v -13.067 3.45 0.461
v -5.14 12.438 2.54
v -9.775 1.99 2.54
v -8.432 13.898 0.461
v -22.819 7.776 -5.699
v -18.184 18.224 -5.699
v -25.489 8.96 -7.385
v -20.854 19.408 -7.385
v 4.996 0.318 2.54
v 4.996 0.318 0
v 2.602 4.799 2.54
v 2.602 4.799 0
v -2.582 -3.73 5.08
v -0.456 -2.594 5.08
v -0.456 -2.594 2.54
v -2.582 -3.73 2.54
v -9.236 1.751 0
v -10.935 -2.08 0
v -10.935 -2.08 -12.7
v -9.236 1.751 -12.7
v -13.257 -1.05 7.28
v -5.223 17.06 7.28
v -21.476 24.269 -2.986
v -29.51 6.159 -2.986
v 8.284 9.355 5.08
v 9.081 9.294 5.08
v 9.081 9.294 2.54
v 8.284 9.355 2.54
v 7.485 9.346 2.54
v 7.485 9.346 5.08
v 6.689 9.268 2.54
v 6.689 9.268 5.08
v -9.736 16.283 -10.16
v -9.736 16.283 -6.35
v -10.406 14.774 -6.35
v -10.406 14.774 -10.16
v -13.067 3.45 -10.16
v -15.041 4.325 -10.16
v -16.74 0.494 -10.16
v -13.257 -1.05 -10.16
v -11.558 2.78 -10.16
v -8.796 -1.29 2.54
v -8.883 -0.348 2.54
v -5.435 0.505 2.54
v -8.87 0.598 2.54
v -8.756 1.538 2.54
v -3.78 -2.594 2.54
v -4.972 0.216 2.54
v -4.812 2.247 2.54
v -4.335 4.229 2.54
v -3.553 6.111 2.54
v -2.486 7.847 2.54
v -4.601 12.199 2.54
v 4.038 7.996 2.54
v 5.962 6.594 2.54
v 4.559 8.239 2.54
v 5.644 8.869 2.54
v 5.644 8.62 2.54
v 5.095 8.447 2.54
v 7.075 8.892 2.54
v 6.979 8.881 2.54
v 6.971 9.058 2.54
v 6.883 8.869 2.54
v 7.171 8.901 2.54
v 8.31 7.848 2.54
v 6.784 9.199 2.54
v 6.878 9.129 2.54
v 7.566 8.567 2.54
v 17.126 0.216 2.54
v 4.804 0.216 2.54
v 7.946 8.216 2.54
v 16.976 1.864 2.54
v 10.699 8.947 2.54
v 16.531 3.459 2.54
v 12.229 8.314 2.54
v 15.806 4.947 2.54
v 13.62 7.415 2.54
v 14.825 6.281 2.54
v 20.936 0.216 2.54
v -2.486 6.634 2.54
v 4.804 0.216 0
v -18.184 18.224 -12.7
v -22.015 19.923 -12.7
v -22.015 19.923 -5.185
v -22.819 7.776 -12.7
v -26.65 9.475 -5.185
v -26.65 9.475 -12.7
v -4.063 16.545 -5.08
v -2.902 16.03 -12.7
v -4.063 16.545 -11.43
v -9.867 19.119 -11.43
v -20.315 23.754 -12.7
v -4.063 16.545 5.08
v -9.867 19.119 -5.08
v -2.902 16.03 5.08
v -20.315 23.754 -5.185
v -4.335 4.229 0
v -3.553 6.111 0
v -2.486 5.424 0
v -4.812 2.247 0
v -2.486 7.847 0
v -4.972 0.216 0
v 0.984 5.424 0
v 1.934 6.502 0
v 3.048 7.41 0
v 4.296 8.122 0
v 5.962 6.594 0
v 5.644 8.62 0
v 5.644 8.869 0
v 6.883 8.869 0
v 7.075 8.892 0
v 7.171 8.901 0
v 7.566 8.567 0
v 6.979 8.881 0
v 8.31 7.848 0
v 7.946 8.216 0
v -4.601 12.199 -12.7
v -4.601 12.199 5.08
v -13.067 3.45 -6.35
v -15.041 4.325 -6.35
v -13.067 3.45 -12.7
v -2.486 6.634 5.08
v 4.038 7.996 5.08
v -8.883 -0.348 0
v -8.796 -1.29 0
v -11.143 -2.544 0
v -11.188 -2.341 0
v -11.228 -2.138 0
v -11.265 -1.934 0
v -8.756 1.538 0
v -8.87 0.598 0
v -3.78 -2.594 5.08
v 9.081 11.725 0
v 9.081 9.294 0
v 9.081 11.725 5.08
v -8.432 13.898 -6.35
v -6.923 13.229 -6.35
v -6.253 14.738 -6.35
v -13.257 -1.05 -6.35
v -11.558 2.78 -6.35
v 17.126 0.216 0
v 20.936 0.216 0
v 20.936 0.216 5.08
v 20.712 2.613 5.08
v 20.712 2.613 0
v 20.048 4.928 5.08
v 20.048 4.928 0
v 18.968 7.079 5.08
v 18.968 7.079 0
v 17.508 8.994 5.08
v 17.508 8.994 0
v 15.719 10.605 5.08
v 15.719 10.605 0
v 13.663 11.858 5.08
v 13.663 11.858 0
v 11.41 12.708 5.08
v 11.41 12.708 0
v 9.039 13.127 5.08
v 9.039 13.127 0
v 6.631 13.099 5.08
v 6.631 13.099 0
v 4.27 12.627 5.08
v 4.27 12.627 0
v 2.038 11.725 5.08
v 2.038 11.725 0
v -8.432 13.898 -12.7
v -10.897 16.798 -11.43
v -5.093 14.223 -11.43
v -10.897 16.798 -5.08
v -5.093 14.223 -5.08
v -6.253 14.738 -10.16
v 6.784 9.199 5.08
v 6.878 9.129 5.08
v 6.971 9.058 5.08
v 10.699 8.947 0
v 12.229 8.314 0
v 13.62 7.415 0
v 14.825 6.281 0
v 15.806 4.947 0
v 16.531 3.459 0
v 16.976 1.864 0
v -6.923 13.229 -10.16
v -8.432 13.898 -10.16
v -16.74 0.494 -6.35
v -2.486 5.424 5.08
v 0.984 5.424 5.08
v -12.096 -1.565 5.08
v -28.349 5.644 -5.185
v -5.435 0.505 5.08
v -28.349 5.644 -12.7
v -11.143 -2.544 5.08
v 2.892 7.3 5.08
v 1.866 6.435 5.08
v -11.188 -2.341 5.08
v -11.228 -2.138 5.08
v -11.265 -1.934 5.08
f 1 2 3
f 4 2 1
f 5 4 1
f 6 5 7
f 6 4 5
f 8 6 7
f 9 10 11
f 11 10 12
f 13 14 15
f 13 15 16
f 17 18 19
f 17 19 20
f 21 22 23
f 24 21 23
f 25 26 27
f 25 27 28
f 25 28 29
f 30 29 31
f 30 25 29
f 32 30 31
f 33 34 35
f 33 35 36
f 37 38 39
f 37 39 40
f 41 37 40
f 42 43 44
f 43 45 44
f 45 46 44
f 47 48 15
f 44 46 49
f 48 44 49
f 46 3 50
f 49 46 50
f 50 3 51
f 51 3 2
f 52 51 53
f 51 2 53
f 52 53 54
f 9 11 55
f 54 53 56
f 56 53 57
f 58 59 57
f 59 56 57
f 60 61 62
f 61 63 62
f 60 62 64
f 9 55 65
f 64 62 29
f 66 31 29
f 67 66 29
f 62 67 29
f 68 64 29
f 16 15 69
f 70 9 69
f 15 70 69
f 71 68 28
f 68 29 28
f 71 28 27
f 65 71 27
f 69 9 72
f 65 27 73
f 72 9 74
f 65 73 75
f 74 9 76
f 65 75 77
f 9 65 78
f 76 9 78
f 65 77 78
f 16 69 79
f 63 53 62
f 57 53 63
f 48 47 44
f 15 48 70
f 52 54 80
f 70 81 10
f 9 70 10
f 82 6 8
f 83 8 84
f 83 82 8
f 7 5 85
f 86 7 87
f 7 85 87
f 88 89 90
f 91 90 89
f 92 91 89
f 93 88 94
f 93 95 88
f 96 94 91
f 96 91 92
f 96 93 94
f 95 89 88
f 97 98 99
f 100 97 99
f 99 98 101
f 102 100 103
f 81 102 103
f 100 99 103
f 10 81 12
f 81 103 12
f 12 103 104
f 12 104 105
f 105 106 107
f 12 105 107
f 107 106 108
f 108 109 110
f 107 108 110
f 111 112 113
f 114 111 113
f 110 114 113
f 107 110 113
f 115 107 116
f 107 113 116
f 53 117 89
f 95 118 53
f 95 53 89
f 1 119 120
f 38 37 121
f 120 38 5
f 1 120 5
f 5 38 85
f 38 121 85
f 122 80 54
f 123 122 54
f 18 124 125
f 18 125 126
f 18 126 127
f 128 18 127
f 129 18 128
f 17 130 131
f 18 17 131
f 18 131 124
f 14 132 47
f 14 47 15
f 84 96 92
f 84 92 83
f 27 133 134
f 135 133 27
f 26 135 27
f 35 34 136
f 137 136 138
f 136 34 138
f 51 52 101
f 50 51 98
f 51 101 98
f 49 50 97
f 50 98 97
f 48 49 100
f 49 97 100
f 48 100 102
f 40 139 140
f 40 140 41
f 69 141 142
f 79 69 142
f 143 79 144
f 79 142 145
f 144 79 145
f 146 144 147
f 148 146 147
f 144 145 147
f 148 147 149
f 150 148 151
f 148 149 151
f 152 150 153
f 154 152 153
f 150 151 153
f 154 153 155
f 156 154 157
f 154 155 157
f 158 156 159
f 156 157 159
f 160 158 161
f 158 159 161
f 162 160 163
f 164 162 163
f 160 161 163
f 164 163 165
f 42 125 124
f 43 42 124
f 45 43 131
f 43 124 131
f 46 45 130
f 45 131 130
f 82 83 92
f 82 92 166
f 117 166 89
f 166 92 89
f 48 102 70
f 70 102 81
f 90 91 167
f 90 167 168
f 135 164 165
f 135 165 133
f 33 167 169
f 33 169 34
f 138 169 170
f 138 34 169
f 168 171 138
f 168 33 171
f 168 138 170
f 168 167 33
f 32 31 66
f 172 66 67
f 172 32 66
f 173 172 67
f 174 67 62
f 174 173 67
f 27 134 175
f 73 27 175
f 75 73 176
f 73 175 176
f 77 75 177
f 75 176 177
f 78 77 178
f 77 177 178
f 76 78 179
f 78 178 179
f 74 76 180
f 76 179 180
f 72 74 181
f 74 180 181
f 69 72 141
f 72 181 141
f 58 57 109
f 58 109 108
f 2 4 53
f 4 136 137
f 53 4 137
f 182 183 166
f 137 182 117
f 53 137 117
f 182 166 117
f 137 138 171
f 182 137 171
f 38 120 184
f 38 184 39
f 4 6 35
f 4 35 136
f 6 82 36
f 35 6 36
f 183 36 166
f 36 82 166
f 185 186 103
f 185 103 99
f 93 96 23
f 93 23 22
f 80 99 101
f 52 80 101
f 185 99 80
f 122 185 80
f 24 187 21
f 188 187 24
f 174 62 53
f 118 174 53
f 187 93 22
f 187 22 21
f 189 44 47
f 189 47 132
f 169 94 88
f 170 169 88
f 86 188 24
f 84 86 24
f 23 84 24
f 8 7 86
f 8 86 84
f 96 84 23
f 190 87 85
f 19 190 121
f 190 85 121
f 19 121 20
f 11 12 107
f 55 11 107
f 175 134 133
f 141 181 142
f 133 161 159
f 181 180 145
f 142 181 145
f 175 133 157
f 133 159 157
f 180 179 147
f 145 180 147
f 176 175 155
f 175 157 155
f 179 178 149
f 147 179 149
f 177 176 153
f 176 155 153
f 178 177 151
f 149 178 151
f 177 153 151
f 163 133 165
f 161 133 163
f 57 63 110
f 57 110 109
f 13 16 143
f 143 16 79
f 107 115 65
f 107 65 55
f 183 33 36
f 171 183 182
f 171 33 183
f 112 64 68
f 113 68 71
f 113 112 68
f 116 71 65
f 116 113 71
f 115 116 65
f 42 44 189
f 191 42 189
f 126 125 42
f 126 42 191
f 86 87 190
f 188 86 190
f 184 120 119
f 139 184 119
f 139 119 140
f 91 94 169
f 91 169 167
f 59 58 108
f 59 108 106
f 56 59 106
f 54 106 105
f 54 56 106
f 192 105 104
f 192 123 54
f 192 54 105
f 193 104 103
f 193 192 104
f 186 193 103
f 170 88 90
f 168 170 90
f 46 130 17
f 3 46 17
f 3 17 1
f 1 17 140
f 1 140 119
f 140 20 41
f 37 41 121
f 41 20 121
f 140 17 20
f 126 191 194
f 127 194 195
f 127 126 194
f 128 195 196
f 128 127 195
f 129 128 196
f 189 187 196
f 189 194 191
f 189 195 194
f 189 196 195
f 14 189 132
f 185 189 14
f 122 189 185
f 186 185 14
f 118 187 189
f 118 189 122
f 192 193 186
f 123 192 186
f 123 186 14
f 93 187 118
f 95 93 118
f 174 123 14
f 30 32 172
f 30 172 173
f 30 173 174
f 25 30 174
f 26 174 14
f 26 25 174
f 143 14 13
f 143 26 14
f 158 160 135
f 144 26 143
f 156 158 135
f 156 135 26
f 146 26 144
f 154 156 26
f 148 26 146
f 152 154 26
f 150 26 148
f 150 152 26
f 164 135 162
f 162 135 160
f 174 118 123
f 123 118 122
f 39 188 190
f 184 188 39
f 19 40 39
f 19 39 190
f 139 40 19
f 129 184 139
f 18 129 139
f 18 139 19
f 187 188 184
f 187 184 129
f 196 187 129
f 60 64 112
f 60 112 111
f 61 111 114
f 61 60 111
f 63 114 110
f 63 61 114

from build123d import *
from build123d.topology import SkipClean

# Parameters (mm, degrees)
BOSS_EXTRUDE1_DEPTH      = 5.08
CUT_EXTRUDE1_DEPTH       = 2.54
SKETCH3_W                = 9.11222741
SKETCH3_H                = 2.54
BOSS_EXTRUDE2_DEPTH      = 5.08
BOSS_EXTRUDE3_DEPTH      = 17.78
CUT_EXTRUDE2_DEPTH       = 15.24
CUT_EXTRUDE3_DEPTH       = 11.43
CHAMFER1_SIZE            = 10.265287786
CHAMFER1_SIZE_2          = 17.78
SKETCH7_W                = 3.81
SKETCH7_H                = 3.81
CUT_EXTRUDE4_DEPTH       = 25.4
SKETCH8_W                = 6.35
SKETCH8_H                = 6.35
CUT_EXTRUDE5_DEPTH       = 2.54
BOSS_EXTRUDE4_DEPTH      = 2.54
BOSS_EXTRUDE4_DEPTH_BACK = 2.54
BOSS_EXTRUDE5_START      = -5.08
BOSS_EXTRUDE5_DEPTH      = 5.08
BOSS_EXTRUDE6_START      = -2.54
BOSS_EXTRUDE6_DEPTH      = 2.54
CUT_EXTRUDE6_DEPTH       = 55.88
CUT_EXTRUDE7_START       = -5.08
CUT_EXTRUDE7_DEPTH       = 5.08
BOSS_EXTRUDE7_DEPTH      = 2.54


# Read off the part's stored shape, not the designer's step: Boss-Extrude5, Cut-Extrude7
with BuildPart() as part:
    # Sketch1 → Boss-Extrude1 (new body)
    with BuildSketch(Plane.XY):
        with BuildLine():
            Line((8.309836615, 7.848026213), (-11.143288506, -2.544016758))
            ThreePointArc((-11.143288506, -2.544016758), (-5.385698811, 10.08162429), (8.309836615, 7.848026213))
        make_face()
    extrude(amount=BOSS_EXTRUDE1_DEPTH)

    # Sketch2 → Cut-Extrude1 (cut)
    with SkipClean():  # the faces are left unmerged after this step: merging them gives an invalid solid
        with BuildSketch(Plane(origin=(0, 0, 0), x_dir=(-1, 0, 0), z_dir=(0, 0, -1))):
            with BuildLine():
                ThreePointArc((-3.514271346, 8.165904537), (4.188876853, 7.841263336), (8.741367154, 1.618826824))
                Line((8.741367154, 1.618826824), (-3.514271346, 8.165904537))
            make_face()
            with BuildLine():
                Line((8.741367154, 1.618826824), (-3.514271346, 8.165904537))
                ThreePointArc((-3.514271346, 8.165904537), (-4.803100251, 7.480797282), (-5.962452981, 6.594031729))
                Line((-5.962452981, 6.594031729), (8.795904873, -1.290022275))
                ThreePointArc((8.795904873, -1.290022275), (8.8884379, 0.166648428), (8.741367154, 1.618826824))
            make_face()
        extrude(amount=-CUT_EXTRUDE1_DEPTH, mode=Mode.SUBTRACT)

    # Sketch3 → Boss-Extrude2 (add)
    with SkipClean():  # the faces are left unmerged after this step: merging them gives an invalid solid
        with BuildSketch(Plane(origin=(-1.416725946, 2.652004727, 0), x_dir=(0.8820318713627303, 0.4711897472360366, 0), z_dir=(0.47118974723603657, -0.8820318713627302, 0))):
            with Locations((0, 3.81)):
                Rectangle(SKETCH3_W, SKETCH3_H)
        extrude(amount=BOSS_EXTRUDE2_DEPTH)

    # Sketch4 → Boss-Extrude3 (add)
    with SkipClean():  # the faces are left unmerged after this step: merging them gives an invalid solid
        with BuildSketch(Plane.XY.offset(5.08)):
            Polygon((-2.901644401, 16.029554576), (-20.315117145, 23.754414899), (-28.34897188, 5.644403245), (-10.935499136, -2.080457077), align=None)
        extrude(amount=-BOSS_EXTRUDE3_DEPTH)

    # Sketch5 → Cut-Extrude2 (cut)
    with BuildSketch(Plane(origin=(0, 0, -12.7), x_dir=(-1, 0, 0), z_dir=(0, 0, -1))):
        Polygon((8.432077676, 13.898059844), (0.608597096, 10.427454319), (5.243513289, -0.020629328), (13.066993869, 3.449976197), (22.818538605, 7.775897978), (18.183622412, 18.223981624), align=None)
    extrude(amount=-CUT_EXTRUDE2_DEPTH, mode=Mode.SUBTRACT)

    # Sketch6 → Cut-Extrude3 (cut)
    with BuildSketch(Plane(origin=(-0.869857896, -1.960844097, 0), x_dir=(0.914093057420647, -0.4055044788598195, 0), z_dir=(0.4055044788598195, 0.914093057420647, 0))):
        Polygon((-24.011429177, -2.54), (-38.355843434, 12.7), (-24.011429177, 12.7), align=None)
    extrude(amount=CUT_EXTRUDE3_DEPTH, mode=Mode.SUBTRACT)

    # Chamfer1
    # the kernel refuses this chamfer: 17.78, 10.265287786 mm, written as the material it takes off along each edge
    with BuildSketch(Plane(origin=(-1.662566122, 65.801219022, 5.08), x_dir=(-0.052920377689547264, 0.02347622050277695, -0.9983227437537927), z_dir=(-0.40550447885981916, -0.9140930574206472, 0))) as chamfer1_piece_1:
        Polygon((CHAMFER1_SIZE * 0.998322743772, CHAMFER1_SIZE * 0.0578938624038), (-CHAMFER1_SIZE_2 * 0.0578938624027, CHAMFER1_SIZE_2 * 0.998322743754), (0, 0), align=None)
    extrude(amount=111.808769435, mode=Mode.SUBTRACT)

    # Sketch7 → Cut-Extrude4 (cut)
    with BuildSketch(Plane(origin=(5.464527568, 12.318203553, 0), x_dir=(0.9140930574206471, -0.40550447885981944, 0), z_dir=(0.4055044788598195, 0.9140930574206472, 0))):
        with Locations((-13.597429177, 8.255)):
            Rectangle(SKETCH7_W, SKETCH7_H)
    extrude(amount=-CUT_EXTRUDE4_DEPTH, mode=Mode.SUBTRACT)

    # Sketch8 → Cut-Extrude5 (cut)
    with BuildSketch(Plane(origin=(5.464527568, 12.318203553, 0), x_dir=(0.9140930574206471, -0.40550447885981944, 0), z_dir=(0.4055044788598195, 0.9140930574206472, 0))):
        with Locations((-13.597429177, 8.255)):
            Rectangle(SKETCH8_W, SKETCH8_H)
    extrude(amount=-CUT_EXTRUDE5_DEPTH, mode=Mode.SUBTRACT)

    # Sketch10 → Boss-Extrude4 (add, two sides: drawn at the far end of the back side and taken through both)
    with BuildSketch(Plane(origin=(-4.392502173, 1.948575465, 8.323044218), x_dir=(0.8894427865769886, 0.10418568638497319, 0.4450133393041759), z_dir=(-0.457046528710329, 0.20275223942991202, 0.8660254037844353)).offset(-BOSS_EXTRUDE4_DEPTH_BACK)):
        Polygon((-26.934244752, 6.677804801), (-17.901786615, 24.311013357), (0.370973372, 14.950950547), (-8.661484766, -2.682258009), align=None)
    extrude(amount=BOSS_EXTRUDE4_DEPTH + BOSS_EXTRUDE4_DEPTH_BACK)

    # Boss-Extrude5 outline → Boss-Extrude5 (add)
    with BuildSketch(Plane.XY.offset(5.08).offset(BOSS_EXTRUDE5_START)):
        with BuildLine():
            Line((2.601911551, 4.798798792), (5.962452981, 6.594031729))
            ThreePointArc((5.962452981, 6.594031729), (2.56067771, 8.513226748), (-1.33537929, 8.789133186))
            Line((-1.33537929, 8.789133186), (-0.995970787, 9.554231902))
            ThreePointArc((-0.995970787, 9.554231902), (-3.936753752, 5.290676536), (-4.972191023, 0.215838758))
            Line((-4.972191023, 0.215838758), (4.804173359, 0.215838758))
            Line((4.804173359, 0.215838758), (4.995555467, 0.318076886))
            Line((4.995555467, 0.318076886), (2.601911551, 4.798798792))
        make_face()
        with BuildLine():
            ThreePointArc((1.359063718, 11.348913861), (4.156560335, 10.647436602), (6.689412036, 9.268045458))
            ThreePointArc((6.689412036, 9.268045458), (13.973263657, 7.123458233), (17.125808977, 0.215838758))
            Line((17.125808977, 0.215838758), (20.935808977, 0.215838758))
            ThreePointArc((20.935808977, 0.215838758), (14.385521725, 11.476326272), (1.359063718, 11.348913861))
        make_face()
    extrude(amount=BOSS_EXTRUDE5_DEPTH)

    # Sketch12 → Boss-Extrude6 (add)
    with BuildSketch(Plane.XY.offset(5.08).offset(BOSS_EXTRUDE6_START)):
        with BuildLine():
            ThreePointArc((17.125808977, 0.215838758), (13.973263657, 7.123458233), (6.689412036, 9.268045458))
            ThreePointArc((6.689412036, 9.268045458), (7.533158613, 8.59630277), (8.309836615, 7.848026213))
            Line((8.309836615, 7.848026213), (2.601911551, 4.798798792))
            Line((2.601911551, 4.798798792), (4.995555467, 0.318076886))
            Line((4.995555467, 0.318076886), (-2.581764519, -3.72979894))
            Line((-2.581764519, -3.72979894), (20.935808977, 0.215838758))
            Line((20.935808977, 0.215838758), (17.125808977, 0.215838758))
        make_face()
    extrude(amount=BOSS_EXTRUDE6_DEPTH)

    # Sketch13 → Cut-Extrude6 (cut)
    with BuildSketch(Plane.XY.offset(5.08)):
        Polygon((-0.455894293, -2.594139008), (-3.041719527, -3.975511244), (-3.779661608, -2.594139008), align=None)
    extrude(amount=-CUT_EXTRUDE6_DEPTH, mode=Mode.SUBTRACT)

    # Cut-Extrude7 outline → Cut-Extrude7 (cut)
    with BuildSketch(Plane(origin=(0, 0, 0), x_dir=(-1, 0, 0), z_dir=(0, 0, -1)).offset(CUT_EXTRUDE7_START)):
        with BuildLine():
            ThreePointArc((-7.17051589, 8.901044988), (-7.026535215, 8.886389823), (-6.882817494, 8.869347956))
            Line((-6.882817494, 8.869347956), (-5.6435439, 8.869347956))
            Line((-5.6435439, 8.869347956), (-5.6435439, 8.619618869))
            ThreePointArc((-5.6435439, 8.619618869), (-3.048054454, 7.409521405), (-0.984312942, 5.424106508))
            Line((-0.984312942, 5.424106508), (2.486117219, 5.424106508))
            Line((2.486117219, 5.424106508), (2.486117219, 8.869347956))
            Line((2.486117219, 8.869347956), (1.657843224, 8.869347956))
            ThreePointArc((1.657843224, 8.869347956), (1.333203623, 9.217874986), (0.995970787, 9.554231902))
            Line((0.995970787, 9.554231902), (0.608597096, 10.427454319))
            Line((0.608597096, 10.427454319), (2.328316525, 11.190345935))
            ThreePointArc((2.328316525, 11.190345935), (0.491068934, 11.41944619), (-1.359063718, 11.34891386))
            ThreePointArc((-1.359063718, 11.34891386), (-1.695483089, 11.542277864), (-2.037543, 11.725478978))
            Line((-2.037543, 11.725478978), (-9.08080046, 11.725478978))
            Line((-9.08080046, 11.725478978), (-9.08080046, 9.293556187))
            ThreePointArc((-9.08080046, 9.293556187), (-7.884268641, 9.359318505), (-6.689412036, 9.268045458))
            ThreePointArc((-6.689412036, 9.268045458), (-6.932393011, 9.087729482), (-7.17051589, 8.901044988))
        make_face()
    extrude(amount=CUT_EXTRUDE7_DEPTH, mode=Mode.SUBTRACT)

    # Sketch15 → Boss-Extrude7 (add)
    with BuildSketch(Plane(origin=(0, 0, 2.54), x_dir=(-1, 0, 0), z_dir=(0, 0, -1))):
        Polygon((-7.906818903, 8.804382246), (4.601113672, 12.198590573), (6.567709174, 7.765467415), (3.37435699, 6.448302999), align=None)
    extrude(amount=-BOSS_EXTRUDE7_DEPTH)


solid = part.part
